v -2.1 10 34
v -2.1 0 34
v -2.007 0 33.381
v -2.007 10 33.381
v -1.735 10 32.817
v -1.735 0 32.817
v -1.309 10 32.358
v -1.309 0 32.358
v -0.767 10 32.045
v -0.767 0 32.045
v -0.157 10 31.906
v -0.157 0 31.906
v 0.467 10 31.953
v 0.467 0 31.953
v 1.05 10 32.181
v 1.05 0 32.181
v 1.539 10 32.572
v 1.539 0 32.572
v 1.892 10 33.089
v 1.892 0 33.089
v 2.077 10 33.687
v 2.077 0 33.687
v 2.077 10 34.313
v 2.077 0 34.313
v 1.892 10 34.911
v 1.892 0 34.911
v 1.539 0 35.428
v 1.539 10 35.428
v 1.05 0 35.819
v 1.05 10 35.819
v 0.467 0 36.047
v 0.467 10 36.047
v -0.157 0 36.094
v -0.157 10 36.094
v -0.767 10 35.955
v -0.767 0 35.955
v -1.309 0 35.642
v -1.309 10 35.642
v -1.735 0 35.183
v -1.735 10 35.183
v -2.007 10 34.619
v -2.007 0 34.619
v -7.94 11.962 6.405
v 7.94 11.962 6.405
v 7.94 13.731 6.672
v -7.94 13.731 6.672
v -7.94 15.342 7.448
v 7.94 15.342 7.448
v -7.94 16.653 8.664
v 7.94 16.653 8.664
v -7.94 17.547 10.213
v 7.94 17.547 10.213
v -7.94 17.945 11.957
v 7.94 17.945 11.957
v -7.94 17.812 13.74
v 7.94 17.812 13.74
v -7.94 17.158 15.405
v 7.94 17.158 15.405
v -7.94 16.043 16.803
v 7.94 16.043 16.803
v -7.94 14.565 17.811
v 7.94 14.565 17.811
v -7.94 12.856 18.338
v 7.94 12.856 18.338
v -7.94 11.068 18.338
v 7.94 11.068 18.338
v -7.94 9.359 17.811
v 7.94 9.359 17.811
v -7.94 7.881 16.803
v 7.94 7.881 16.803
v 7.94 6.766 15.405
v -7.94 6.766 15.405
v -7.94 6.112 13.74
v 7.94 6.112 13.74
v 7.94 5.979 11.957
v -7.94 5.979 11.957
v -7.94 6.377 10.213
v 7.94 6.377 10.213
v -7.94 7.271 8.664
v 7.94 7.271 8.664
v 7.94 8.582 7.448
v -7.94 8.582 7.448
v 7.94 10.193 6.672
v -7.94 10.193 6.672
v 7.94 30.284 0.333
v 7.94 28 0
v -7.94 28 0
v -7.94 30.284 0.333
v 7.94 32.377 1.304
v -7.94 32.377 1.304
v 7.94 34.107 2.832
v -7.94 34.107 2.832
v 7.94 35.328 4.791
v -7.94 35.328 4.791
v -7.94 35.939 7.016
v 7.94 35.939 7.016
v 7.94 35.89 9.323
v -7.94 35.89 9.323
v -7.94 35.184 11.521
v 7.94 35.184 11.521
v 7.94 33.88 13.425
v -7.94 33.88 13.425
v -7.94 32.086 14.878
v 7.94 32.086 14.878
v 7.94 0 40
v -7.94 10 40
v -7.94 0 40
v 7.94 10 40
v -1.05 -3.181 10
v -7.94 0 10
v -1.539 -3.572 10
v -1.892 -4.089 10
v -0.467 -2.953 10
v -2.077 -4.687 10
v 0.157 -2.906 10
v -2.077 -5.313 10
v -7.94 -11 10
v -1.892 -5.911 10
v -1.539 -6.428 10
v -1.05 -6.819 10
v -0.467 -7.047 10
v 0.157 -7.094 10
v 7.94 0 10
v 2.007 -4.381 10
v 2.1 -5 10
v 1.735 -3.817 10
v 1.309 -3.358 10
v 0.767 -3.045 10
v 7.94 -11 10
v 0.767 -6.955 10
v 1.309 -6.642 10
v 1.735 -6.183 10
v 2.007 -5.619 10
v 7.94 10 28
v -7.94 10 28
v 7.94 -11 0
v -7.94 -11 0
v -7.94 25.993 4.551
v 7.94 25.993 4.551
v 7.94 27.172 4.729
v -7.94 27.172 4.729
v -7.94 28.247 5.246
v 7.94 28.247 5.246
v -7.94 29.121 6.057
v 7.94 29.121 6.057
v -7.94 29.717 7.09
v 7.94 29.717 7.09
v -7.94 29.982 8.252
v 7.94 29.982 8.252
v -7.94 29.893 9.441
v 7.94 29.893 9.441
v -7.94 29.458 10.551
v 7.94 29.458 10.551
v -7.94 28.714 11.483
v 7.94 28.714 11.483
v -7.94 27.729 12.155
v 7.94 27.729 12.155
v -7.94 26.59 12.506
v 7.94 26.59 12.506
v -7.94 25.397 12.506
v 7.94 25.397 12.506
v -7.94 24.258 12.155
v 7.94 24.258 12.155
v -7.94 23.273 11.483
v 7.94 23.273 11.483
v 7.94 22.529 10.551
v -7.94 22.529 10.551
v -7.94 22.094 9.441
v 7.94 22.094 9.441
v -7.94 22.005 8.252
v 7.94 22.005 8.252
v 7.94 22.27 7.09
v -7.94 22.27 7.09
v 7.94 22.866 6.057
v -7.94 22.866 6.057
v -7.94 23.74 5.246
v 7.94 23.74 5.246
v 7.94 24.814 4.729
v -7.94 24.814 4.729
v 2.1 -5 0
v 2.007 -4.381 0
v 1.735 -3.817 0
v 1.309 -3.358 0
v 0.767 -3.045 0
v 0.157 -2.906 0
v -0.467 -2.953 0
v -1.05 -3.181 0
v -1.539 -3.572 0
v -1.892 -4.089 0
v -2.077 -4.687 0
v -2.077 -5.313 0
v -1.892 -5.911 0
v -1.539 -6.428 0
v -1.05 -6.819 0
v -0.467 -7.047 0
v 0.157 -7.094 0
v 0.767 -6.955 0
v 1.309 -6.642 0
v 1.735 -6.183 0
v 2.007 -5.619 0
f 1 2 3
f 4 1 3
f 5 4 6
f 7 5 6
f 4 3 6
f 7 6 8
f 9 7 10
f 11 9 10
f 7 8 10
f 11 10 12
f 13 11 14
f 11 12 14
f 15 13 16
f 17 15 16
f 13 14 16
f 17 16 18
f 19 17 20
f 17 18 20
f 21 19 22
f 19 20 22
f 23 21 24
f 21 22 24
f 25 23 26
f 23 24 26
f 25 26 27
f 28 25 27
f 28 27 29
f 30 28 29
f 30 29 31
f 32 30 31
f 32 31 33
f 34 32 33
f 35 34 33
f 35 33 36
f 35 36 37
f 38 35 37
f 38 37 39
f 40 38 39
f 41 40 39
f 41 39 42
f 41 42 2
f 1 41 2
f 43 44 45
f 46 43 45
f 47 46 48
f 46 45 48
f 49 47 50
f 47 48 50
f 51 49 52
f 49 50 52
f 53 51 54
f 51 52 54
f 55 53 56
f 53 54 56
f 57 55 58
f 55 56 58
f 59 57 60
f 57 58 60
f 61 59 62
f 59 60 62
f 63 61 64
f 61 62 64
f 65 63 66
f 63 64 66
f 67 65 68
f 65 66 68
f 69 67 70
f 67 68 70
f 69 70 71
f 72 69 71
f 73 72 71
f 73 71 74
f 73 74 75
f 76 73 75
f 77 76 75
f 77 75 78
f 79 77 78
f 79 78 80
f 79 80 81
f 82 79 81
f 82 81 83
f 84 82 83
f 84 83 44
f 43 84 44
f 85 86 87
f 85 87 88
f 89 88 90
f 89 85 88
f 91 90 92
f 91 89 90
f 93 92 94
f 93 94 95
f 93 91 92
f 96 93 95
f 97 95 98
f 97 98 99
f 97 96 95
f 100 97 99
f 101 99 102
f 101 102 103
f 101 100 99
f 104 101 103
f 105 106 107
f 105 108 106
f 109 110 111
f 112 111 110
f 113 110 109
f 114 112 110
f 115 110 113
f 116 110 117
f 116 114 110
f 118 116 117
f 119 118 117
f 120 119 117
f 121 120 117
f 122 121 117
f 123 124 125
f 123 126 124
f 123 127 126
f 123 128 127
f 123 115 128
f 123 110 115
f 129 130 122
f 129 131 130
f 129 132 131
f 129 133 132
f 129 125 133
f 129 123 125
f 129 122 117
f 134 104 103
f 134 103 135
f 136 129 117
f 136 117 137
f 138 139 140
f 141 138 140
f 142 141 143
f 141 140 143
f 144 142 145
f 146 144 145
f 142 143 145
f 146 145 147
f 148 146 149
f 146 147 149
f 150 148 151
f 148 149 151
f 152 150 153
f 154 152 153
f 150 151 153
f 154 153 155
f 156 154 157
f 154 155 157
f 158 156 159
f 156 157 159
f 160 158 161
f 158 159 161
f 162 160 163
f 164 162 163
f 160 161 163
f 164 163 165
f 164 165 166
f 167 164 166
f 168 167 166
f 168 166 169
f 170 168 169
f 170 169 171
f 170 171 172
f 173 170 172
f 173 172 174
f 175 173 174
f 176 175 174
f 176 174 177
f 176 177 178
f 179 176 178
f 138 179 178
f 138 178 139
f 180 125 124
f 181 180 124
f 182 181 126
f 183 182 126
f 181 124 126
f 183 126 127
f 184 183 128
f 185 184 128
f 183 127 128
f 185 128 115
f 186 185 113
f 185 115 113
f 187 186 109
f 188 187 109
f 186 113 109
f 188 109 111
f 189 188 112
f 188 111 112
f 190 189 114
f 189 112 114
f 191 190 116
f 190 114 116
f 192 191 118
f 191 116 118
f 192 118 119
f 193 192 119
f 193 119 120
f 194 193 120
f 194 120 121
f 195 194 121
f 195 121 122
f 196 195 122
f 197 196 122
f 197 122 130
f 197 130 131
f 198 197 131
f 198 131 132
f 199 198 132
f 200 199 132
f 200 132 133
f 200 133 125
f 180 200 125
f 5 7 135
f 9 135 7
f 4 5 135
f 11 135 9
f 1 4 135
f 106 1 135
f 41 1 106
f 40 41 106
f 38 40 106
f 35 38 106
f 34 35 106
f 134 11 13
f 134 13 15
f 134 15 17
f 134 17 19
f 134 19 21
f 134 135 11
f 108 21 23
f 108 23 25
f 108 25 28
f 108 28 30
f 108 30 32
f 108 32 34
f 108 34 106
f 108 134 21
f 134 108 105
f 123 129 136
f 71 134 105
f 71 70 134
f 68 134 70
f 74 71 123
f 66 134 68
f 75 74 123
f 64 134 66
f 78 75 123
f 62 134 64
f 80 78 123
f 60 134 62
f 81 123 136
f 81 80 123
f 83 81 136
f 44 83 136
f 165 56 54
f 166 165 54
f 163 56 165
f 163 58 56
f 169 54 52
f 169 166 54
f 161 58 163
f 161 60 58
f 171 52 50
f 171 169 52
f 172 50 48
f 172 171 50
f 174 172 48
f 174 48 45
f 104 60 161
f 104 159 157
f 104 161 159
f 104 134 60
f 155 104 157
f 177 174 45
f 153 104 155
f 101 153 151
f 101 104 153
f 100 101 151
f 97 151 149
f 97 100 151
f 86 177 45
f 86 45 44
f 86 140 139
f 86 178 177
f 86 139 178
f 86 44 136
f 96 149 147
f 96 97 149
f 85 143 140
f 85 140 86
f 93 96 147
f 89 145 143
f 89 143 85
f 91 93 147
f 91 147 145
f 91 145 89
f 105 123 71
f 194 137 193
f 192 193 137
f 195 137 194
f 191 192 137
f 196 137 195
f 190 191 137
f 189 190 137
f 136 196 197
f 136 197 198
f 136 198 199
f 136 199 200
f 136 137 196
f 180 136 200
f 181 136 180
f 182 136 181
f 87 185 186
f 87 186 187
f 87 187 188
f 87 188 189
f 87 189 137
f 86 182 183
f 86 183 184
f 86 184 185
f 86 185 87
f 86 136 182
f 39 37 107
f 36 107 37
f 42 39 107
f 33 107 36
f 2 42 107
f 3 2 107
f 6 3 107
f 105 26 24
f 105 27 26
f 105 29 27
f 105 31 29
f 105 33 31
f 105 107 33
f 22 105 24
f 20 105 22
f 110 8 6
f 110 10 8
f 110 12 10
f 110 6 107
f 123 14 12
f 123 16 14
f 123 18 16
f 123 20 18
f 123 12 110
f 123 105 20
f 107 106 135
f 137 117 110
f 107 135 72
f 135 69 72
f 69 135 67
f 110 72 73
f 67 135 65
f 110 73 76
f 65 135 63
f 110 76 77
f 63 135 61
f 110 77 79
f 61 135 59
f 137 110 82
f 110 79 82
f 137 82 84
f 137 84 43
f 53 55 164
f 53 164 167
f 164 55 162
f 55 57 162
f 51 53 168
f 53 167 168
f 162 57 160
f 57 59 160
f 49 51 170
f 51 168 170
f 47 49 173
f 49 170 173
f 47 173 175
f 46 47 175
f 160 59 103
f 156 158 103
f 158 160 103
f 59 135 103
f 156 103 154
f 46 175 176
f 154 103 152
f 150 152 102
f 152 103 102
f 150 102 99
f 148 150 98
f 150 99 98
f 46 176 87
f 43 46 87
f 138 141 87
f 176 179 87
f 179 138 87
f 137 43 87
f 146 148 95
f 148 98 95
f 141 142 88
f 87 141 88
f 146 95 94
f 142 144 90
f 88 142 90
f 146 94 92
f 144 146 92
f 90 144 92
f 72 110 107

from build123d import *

# Parameters (mm, degrees)
RESSALTO_EXTRUS_O1_DEPTH                       = 7.94
BROCA_DE_ROSQUEAR_PARA_TARRAXA_DE_M5X0_8_D     = 4.2
BROCA_DE_ROSQUEAR_PARA_TARRAXA_DE_M5X0_8_DEPTH = 20
BROCA_DE_ROSQUEAR_PARA_TARRAXA_DE_M5X0_8_TIP   = 1.2618073
BROCA_DE_ROSQUEAR_PARA_TARRAXA_DE_M5_2_D       = 4.2
BROCA_DE_ROSQUEAR_PARA_TARRAXA_DE_M5_2_DEPTH   = 20
BROCA_DE_ROSQUEAR_PARA_TARRAXA_DE_M5_2_TIP     = 1.2618073
BROCA_DE_ROSQUEAR_PARA_TARRAXA_DE_M5_3_D       = 4.2
BROCA_DE_ROSQUEAR_PARA_TARRAXA_DE_M5_3_DEPTH   = 20
BROCA_DE_ROSQUEAR_PARA_TARRAXA_DE_M5_3_TIP     = 1.2618073
BROCA_DE_ROSQUEAR_PARA_TARRAXA_DE_M5_4_D       = 4.2
BROCA_DE_ROSQUEAR_PARA_TARRAXA_DE_M5_4_DEPTH   = 20
BROCA_DE_ROSQUEAR_PARA_TARRAXA_DE_M5_4_TIP     = 1.2618073
ESBO_O10_R                                     = 6
ESBO_O10_R_2                                   = 4
CORTE_EXTRUS_O1_DEPTH                          = 57.108594707


with BuildPart() as part:
    # Esboço1 → Ressalto-extrusão1 (new, symmetric)
    with BuildSketch(Plane(origin=(0, 0, 0), x_dir=(0, 0, -1), z_dir=(1, 0, 0))):
        with BuildLine():
            Line((-40, 0), (-10, 0))
            Line((-10, 0), (-10, -11))
            Line((-10, -11), (0, -11))
            Line((0, -11), (0, 0))
            Line((0, 0), (0, 28))
            ThreePointArc((0, 28), (-5.881190502, 35.714314377), (-14.877661578, 32.086290643))
            Line((-14.877661578, 32.086290643), (-28, 10))
            Line((-28, 10), (-40, 10))
            Line((-40, 10), (-40, 0))
        make_face()
    extrude(amount=RESSALTO_EXTRUS_O1_DEPTH, both=True)

    # Broca de rosquear para tarraxa de M5x0.8
    with Locations(Plane(origin=(33.065, 10, -11.460196829), x_dir=(1, 0, 0), z_dir=(0, 1, 0))):
        with Locations((33.06, -45.460196829), (-33.065, -45.460196829)):
            Hole(BROCA_DE_ROSQUEAR_PARA_TARRAXA_DE_M5X0_8_D / 2, depth=BROCA_DE_ROSQUEAR_PARA_TARRAXA_DE_M5X0_8_DEPTH)
            with Locations((0, 0, -(BROCA_DE_ROSQUEAR_PARA_TARRAXA_DE_M5X0_8_DEPTH + BROCA_DE_ROSQUEAR_PARA_TARRAXA_DE_M5X0_8_TIP / 2))):  # 118° drill point
                Cone(0, BROCA_DE_ROSQUEAR_PARA_TARRAXA_DE_M5X0_8_D / 2, BROCA_DE_ROSQUEAR_PARA_TARRAXA_DE_M5X0_8_TIP, mode=Mode.SUBTRACT)

    # Broca de rosquear para tarraxa de M5 2
    with Locations(Plane(origin=(-33.06, 10, -11.460196829), x_dir=(1, 0, 0), z_dir=(0, 1, 0))):
        with Locations((33.06, -45.460196829), (-33.065, -45.460196829)):
            Hole(BROCA_DE_ROSQUEAR_PARA_TARRAXA_DE_M5_2_D / 2, depth=BROCA_DE_ROSQUEAR_PARA_TARRAXA_DE_M5_2_DEPTH)
            with Locations((0, 0, -(BROCA_DE_ROSQUEAR_PARA_TARRAXA_DE_M5_2_DEPTH + BROCA_DE_ROSQUEAR_PARA_TARRAXA_DE_M5_2_TIP / 2))):  # 118° drill point
                Cone(0, BROCA_DE_ROSQUEAR_PARA_TARRAXA_DE_M5_2_D / 2, BROCA_DE_ROSQUEAR_PARA_TARRAXA_DE_M5_2_TIP, mode=Mode.SUBTRACT)

    # Broca de rosquear para tarraxa de M5 3
    with Locations(Plane(origin=(33.065, -48.751665499, 0), x_dir=(-1, 0, 0), z_dir=(0, 0, -1))):
        with Locations((-33.06, 43.751665499), (33.065, 43.751665499)):
            Hole(BROCA_DE_ROSQUEAR_PARA_TARRAXA_DE_M5_3_D / 2, depth=BROCA_DE_ROSQUEAR_PARA_TARRAXA_DE_M5_3_DEPTH)
            with Locations((0, 0, -(BROCA_DE_ROSQUEAR_PARA_TARRAXA_DE_M5_3_DEPTH + BROCA_DE_ROSQUEAR_PARA_TARRAXA_DE_M5_3_TIP / 2))):  # 118° drill point
                Cone(0, BROCA_DE_ROSQUEAR_PARA_TARRAXA_DE_M5_3_D / 2, BROCA_DE_ROSQUEAR_PARA_TARRAXA_DE_M5_3_TIP, mode=Mode.SUBTRACT)

    # Broca de rosquear para tarraxa de M5 4
    with Locations(Plane(origin=(-33.06, -48.751665499, 0), x_dir=(-1, 0, 0), z_dir=(0, 0, -1))):
        with Locations((-33.06, 43.751665499), (33.065, 43.751665499)):
            Hole(BROCA_DE_ROSQUEAR_PARA_TARRAXA_DE_M5_4_D / 2, depth=BROCA_DE_ROSQUEAR_PARA_TARRAXA_DE_M5_4_DEPTH)
            with Locations((0, 0, -(BROCA_DE_ROSQUEAR_PARA_TARRAXA_DE_M5_4_DEPTH + BROCA_DE_ROSQUEAR_PARA_TARRAXA_DE_M5_4_TIP / 2))):  # 118° drill point
                Cone(0, BROCA_DE_ROSQUEAR_PARA_TARRAXA_DE_M5_4_D / 2, BROCA_DE_ROSQUEAR_PARA_TARRAXA_DE_M5_4_TIP, mode=Mode.SUBTRACT)

    # Esboço10 → Corte-extrusão1 (cut, through all)
    with BuildSketch(Plane(origin=(7.94, 0, 0), x_dir=(0, 0, -1), z_dir=(1, 0, 0))):
        with Locations((-12.404989074, 11.961998196)):
            Circle(ESBO_O10_R)
        with Locations((-8.551110249, 25.993478071)):
            Circle(ESBO_O10_R_2)
    extrude(amount=-CORTE_EXTRUS_O1_DEPTH, mode=Mode.SUBTRACT)


solid = part.part
